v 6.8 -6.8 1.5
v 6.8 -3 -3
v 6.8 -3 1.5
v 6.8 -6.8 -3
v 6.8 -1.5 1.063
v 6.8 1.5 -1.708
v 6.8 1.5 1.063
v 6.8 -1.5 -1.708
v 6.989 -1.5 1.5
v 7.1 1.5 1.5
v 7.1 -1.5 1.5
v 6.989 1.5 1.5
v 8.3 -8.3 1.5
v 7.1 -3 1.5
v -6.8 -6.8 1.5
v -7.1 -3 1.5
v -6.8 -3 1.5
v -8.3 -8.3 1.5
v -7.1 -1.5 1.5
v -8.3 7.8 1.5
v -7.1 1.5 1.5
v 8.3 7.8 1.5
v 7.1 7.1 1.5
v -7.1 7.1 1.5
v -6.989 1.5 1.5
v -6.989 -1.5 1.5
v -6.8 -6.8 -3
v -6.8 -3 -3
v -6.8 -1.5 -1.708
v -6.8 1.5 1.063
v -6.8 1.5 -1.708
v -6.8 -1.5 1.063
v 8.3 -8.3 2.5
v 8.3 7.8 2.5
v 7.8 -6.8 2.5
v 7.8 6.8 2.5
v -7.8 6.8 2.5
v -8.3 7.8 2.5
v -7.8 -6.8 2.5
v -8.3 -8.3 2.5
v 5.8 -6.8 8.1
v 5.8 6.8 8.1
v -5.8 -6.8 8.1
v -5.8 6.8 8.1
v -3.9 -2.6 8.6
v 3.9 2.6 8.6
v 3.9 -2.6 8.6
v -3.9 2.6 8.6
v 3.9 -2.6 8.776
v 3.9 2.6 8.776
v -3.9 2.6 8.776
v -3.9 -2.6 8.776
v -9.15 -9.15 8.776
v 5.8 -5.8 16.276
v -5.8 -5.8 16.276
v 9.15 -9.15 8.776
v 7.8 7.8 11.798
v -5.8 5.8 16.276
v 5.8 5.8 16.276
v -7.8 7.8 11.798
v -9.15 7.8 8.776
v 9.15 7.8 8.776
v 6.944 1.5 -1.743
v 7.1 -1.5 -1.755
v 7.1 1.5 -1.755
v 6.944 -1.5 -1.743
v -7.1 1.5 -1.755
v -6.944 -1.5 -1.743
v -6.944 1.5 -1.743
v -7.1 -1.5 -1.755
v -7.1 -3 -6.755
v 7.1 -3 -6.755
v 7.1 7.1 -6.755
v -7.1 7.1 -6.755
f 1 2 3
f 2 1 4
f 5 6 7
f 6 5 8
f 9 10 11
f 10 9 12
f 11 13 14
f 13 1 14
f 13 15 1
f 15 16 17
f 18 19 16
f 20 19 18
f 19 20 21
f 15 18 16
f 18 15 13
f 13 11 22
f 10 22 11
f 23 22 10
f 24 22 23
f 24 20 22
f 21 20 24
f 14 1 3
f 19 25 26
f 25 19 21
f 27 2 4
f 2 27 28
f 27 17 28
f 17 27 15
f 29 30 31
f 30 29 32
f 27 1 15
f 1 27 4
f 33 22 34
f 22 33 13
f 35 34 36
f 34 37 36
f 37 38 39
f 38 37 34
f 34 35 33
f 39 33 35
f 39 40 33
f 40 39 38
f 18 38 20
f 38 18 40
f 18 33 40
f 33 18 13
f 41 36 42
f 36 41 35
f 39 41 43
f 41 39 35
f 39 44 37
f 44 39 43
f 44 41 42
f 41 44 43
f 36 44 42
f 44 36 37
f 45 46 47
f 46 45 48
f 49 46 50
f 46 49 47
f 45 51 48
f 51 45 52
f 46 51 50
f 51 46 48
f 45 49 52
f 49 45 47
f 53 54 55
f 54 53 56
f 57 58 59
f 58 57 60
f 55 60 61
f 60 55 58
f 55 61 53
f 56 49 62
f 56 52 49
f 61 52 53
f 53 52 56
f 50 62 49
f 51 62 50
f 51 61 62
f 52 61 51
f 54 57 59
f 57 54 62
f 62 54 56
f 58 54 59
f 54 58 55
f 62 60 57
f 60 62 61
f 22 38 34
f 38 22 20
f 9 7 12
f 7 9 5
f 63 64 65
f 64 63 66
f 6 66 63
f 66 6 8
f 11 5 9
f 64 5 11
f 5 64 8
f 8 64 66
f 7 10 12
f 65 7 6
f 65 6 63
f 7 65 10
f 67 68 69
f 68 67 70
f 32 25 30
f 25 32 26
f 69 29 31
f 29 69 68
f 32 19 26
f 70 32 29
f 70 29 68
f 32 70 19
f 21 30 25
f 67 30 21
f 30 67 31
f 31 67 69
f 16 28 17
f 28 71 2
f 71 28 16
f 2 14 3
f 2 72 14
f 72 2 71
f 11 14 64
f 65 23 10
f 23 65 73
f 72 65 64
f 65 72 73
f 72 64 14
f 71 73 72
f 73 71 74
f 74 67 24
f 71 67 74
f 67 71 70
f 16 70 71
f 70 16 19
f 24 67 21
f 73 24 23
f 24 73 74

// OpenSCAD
plate_thickness = 1;
plate_size = 15.6;
edge_offset = 1;
bottom_height = 5;
bottom_size = plate_size - 2;

top_height = 11.6;

switch_height = 3.0;
switch_thick = 1;
switch_width = 5;
switch_length = 3;

cap_height = .38*25.4;
cap_heightShift = 0.69*25.4;
cap_width = 18.3;

clip_Length = 3;  // length clipped

//dummy key switch with caps to check position
module Switch(switchScale= [1,1,1], colors = "teal", clipLength = 0)
{
  difference(){
    union(){
      translate([0,0,-switch_height])
      {
        color("grey"){
          translate([-bottom_size/2, -bottom_size/2 ,0])cube([bottom_size,bottom_size,bottom_height]);
          translate([-plate_size/2-edge_offset /2, -plate_size/2-edge_offset/2, bottom_height])cube([15.6+edge_offset ,15.6+edge_offset ,1]);

          translate([-plate_size/2, -plate_size/2, bottom_height])cube([15.6,15.6,1]);
          translate([-plate_size/2, -plate_size/2, bottom_height])cube([15.6,15.6,1]);

          translate([0,0, bottom_height+plate_thickness])translate([-15.6/2,13.6/2,0])rotate([90,0,0])linear_extrude(13.6)polygon(points = [[0,0], [15.6, 0], [13.6, 5.6], [2,5.6]]);
        }

        color("purple"){
          translate([-switch_width/2, -switch_thick/2, top_height])cube([switch_width, switch_thick, switch_height]);
          translate([-switch_thick/2, -switch_length/2, top_height])cube([switch_thick, switch_length, switch_height]);
          translate([-plate_size/4, -plate_size/6, top_height])cube([plate_size/2, plate_size/3, 0.25]);
        }

        scale(switchScale)color(colors){
          translate([0,0,cap_heightShift-2])rotate([0,0,45])cylinder(d1 = cap_width*sqrt(2),d2 = (plate_size -4)*sqrt(2), 7.5, $fn=4, center = true);
        }
        bottom_height = 4.5;
        bottom_chamfer_width = 3.05;
        bottom_chamfer_height =  1;
        bottom_chamfer_thickness = .6;

        bottom_peg_diameter = 4.075/.97;
        bottom_peg_height =  3.5;
        bottom_peg_chamfer = .5;
        bottom_peg_side_scale = 1.7/4;

        color("grey"){
          translate([0,0, -(bottom_peg_height -bottom_peg_chamfer)]){
            cylinder(d=bottom_peg_diameter, h= bottom_peg_height -bottom_peg_chamfer);
            translate([5,0,0])scale(v=[bottom_peg_side_scale,bottom_peg_side_scale,1])cylinder(d=bottom_peg_diameter, h= bottom_peg_height -bottom_peg_chamfer);
            translate([-5,0,0])scale(v=[bottom_peg_side_scale,bottom_peg_side_scale,1])cylinder(d=bottom_peg_diameter, h= bottom_peg_height -bottom_peg_chamfer);

            translate([0,0, -bottom_peg_chamfer]){
              cylinder(d2=bottom_peg_diameter , d1 = bottom_peg_diameter -2*bottom_peg_chamfer, h= bottom_peg_chamfer);
              translate([5,0,0])scale(v=[bottom_peg_side_scale,bottom_peg_side_scale,1])cylinder(d2=bottom_peg_diameter , d1 = bottom_peg_diameter -2*bottom_peg_chamfer, h= bottom_peg_chamfer);
              translate([-5,0,0])scale(v=[bottom_peg_side_scale,bottom_peg_side_scale,1])cylinder(d2=bottom_peg_diameter , d1 = bottom_peg_diameter -2*bottom_peg_chamfer, h= bottom_peg_chamfer);
            }
          }
        }
      }
    }
    if (clipLength != 0){ // commiting unholy act in name of ergonomics
      translate([0, -sign(clipLength)*7.8-clipLength,  0])cube([20, 15.6, 40], center = true);
    }
  }
}

module Cutter()
{
  bottom_height = 4.5;
  bottom_chamfer_width = 3;
  bottom_chamfer_height =  1;
  bottom_chamfer_thickness = .6;

  bottom_peg_diameter = 4;
  bottom_peg_height =  3;
  bottom_peg_chamfer = 1;
  bottom_peg_side_scale = 1.7/4;

  translate([-bottom_size/2, -bottom_size/2 ,0])cube([bottom_size,bottom_size,bottom_height]);

  translate([0,0, -(bottom_peg_height -bottom_peg_chamfer)]){
    cylinder(d=bottom_peg_diameter, h= bottom_peg_height -bottom_peg_chamfer);
    translate([5,0,0])scale(v=[bottom_peg_side_scale,bottom_peg_side_scale,1])cylinder(d=bottom_peg_diameter, h= bottom_peg_height -bottom_peg_chamfer);
    translate([-5,0,0])scale(v=[bottom_peg_side_scale,bottom_peg_side_scale,1])cylinder(d=bottom_peg_diameter, h= bottom_peg_height -bottom_peg_chamfer);

    translate([0,0, -bottom_peg_chamfer]){
      cylinder(d2=bottom_peg_diameter , d1 = bottom_peg_diameter -2*bottom_peg_chamfer, h= bottom_peg_chamfer);
      translate([5,0,0])scale(v=[bottom_peg_side_scale,bottom_peg_side_scale,1])cylinder(d2=bottom_peg_diameter , d1 = bottom_peg_diameter -2*bottom_peg_chamfer, h= bottom_peg_chamfer);
      translate([-5,0,0])scale(v=[bottom_peg_side_scale,bottom_peg_side_scale,1])cylinder(d2=bottom_peg_diameter , d1 = bottom_peg_diameter -2*bottom_peg_chamfer, h= bottom_peg_chamfer);
    }
  }
}

//MX series keyhole
// TODO: add alps support?
module Keyhole(tol = .1, cutThickness = 5, clipLength = 0)
{
  $fn = 40;
  bottom_length = 13.9+tol;
   plate_thickness = 3.51; //mm
  holeLength = bottom_length+tol*2;
  //latch nibs
  nib_radius= 1;
  nib_length = 3;

  difference(){
    translate([0,0,-cutThickness/2])cube( [holeLength, holeLength, plate_thickness+cutThickness], center =true);

    union(){
      hull(){
        translate([(holeLength)/2, ,0,-plate_thickness/2+nib_radius])rotate([90,0,0])cylinder(r =nib_radius , nib_length,center = true);
        translate([(holeLength)/2, ,-nib_length/2,-plate_thickness/2])cube([nib_radius*2, nib_length, plate_thickness]);
      }
      mirror([1,0,0])hull(){
        translate([(holeLength)/2, ,0,-plate_thickness/2+nib_radius])rotate([90,0,0])cylinder(r =nib_radius , nib_length,center = true);
        translate([(holeLength)/2, ,-nib_length/2,-plate_thickness/2])cube([nib_radius*2, nib_length, plate_thickness]);
      }
      if (clipLength != 0){
        translate([0, -sign(clipLength)*7.8-clipLength, 0])cube([20, 15.6, 40], center = true);
      }
    }
  }
}

module Stabilizer(offsets = 23.8/2)
{
  plate_thickness = 3.6; //mm
  stabilizer_width = 5;
  stabilizer_length = 12.2;
  translate([offsets,0,0])cube([stabilizer_width,stabilizer_length,plate_thickness], center = true);
  translate([-offsets,0,0])cube([stabilizer_width,stabilizer_length,plate_thickness], center = true);
}

module TrackPoint(nibLength = 20)
{
  color("red")translate([0,0,-.5])cube([4.5,4.5,5], center= true); //nib
  color("gold")cylinder(d = 2, nibLength); //nib
  color("gold")translate([0,0,nibLength])sphere(2); //nib
  translate([0,30.3/2-8,-3/2])cube([26.46, 30.3, 3], center = true);
}

module RotaryEncoder(stemLength = 13, Wheel = 0)
{
 color("grey")translate([0,0, -6.1/2])cube([11.5, 13.5, 6.1], center = true);
 cylinder(d = 7, 7.8);

 translate([0,0,7.8])difference(){
   cylinder(d = 5.8, stemLength);
   translate([-5.8/2,5.8/2-1.5,3])cube([11.5, 13.5, stemLength]);
 }
 color("grey")translate([0,0,7.8])cylinder(d = Wheel, stemLength);
}

//################ Test Calls ###################
Switch(clipLength = -7.8);
Keyhole(.1, clipLength = 3);
//Stabilizer(20);
// RotaryEncoder(Wheel = 0);
//Switch([1,1.5,1]);
//TrackPoint();
